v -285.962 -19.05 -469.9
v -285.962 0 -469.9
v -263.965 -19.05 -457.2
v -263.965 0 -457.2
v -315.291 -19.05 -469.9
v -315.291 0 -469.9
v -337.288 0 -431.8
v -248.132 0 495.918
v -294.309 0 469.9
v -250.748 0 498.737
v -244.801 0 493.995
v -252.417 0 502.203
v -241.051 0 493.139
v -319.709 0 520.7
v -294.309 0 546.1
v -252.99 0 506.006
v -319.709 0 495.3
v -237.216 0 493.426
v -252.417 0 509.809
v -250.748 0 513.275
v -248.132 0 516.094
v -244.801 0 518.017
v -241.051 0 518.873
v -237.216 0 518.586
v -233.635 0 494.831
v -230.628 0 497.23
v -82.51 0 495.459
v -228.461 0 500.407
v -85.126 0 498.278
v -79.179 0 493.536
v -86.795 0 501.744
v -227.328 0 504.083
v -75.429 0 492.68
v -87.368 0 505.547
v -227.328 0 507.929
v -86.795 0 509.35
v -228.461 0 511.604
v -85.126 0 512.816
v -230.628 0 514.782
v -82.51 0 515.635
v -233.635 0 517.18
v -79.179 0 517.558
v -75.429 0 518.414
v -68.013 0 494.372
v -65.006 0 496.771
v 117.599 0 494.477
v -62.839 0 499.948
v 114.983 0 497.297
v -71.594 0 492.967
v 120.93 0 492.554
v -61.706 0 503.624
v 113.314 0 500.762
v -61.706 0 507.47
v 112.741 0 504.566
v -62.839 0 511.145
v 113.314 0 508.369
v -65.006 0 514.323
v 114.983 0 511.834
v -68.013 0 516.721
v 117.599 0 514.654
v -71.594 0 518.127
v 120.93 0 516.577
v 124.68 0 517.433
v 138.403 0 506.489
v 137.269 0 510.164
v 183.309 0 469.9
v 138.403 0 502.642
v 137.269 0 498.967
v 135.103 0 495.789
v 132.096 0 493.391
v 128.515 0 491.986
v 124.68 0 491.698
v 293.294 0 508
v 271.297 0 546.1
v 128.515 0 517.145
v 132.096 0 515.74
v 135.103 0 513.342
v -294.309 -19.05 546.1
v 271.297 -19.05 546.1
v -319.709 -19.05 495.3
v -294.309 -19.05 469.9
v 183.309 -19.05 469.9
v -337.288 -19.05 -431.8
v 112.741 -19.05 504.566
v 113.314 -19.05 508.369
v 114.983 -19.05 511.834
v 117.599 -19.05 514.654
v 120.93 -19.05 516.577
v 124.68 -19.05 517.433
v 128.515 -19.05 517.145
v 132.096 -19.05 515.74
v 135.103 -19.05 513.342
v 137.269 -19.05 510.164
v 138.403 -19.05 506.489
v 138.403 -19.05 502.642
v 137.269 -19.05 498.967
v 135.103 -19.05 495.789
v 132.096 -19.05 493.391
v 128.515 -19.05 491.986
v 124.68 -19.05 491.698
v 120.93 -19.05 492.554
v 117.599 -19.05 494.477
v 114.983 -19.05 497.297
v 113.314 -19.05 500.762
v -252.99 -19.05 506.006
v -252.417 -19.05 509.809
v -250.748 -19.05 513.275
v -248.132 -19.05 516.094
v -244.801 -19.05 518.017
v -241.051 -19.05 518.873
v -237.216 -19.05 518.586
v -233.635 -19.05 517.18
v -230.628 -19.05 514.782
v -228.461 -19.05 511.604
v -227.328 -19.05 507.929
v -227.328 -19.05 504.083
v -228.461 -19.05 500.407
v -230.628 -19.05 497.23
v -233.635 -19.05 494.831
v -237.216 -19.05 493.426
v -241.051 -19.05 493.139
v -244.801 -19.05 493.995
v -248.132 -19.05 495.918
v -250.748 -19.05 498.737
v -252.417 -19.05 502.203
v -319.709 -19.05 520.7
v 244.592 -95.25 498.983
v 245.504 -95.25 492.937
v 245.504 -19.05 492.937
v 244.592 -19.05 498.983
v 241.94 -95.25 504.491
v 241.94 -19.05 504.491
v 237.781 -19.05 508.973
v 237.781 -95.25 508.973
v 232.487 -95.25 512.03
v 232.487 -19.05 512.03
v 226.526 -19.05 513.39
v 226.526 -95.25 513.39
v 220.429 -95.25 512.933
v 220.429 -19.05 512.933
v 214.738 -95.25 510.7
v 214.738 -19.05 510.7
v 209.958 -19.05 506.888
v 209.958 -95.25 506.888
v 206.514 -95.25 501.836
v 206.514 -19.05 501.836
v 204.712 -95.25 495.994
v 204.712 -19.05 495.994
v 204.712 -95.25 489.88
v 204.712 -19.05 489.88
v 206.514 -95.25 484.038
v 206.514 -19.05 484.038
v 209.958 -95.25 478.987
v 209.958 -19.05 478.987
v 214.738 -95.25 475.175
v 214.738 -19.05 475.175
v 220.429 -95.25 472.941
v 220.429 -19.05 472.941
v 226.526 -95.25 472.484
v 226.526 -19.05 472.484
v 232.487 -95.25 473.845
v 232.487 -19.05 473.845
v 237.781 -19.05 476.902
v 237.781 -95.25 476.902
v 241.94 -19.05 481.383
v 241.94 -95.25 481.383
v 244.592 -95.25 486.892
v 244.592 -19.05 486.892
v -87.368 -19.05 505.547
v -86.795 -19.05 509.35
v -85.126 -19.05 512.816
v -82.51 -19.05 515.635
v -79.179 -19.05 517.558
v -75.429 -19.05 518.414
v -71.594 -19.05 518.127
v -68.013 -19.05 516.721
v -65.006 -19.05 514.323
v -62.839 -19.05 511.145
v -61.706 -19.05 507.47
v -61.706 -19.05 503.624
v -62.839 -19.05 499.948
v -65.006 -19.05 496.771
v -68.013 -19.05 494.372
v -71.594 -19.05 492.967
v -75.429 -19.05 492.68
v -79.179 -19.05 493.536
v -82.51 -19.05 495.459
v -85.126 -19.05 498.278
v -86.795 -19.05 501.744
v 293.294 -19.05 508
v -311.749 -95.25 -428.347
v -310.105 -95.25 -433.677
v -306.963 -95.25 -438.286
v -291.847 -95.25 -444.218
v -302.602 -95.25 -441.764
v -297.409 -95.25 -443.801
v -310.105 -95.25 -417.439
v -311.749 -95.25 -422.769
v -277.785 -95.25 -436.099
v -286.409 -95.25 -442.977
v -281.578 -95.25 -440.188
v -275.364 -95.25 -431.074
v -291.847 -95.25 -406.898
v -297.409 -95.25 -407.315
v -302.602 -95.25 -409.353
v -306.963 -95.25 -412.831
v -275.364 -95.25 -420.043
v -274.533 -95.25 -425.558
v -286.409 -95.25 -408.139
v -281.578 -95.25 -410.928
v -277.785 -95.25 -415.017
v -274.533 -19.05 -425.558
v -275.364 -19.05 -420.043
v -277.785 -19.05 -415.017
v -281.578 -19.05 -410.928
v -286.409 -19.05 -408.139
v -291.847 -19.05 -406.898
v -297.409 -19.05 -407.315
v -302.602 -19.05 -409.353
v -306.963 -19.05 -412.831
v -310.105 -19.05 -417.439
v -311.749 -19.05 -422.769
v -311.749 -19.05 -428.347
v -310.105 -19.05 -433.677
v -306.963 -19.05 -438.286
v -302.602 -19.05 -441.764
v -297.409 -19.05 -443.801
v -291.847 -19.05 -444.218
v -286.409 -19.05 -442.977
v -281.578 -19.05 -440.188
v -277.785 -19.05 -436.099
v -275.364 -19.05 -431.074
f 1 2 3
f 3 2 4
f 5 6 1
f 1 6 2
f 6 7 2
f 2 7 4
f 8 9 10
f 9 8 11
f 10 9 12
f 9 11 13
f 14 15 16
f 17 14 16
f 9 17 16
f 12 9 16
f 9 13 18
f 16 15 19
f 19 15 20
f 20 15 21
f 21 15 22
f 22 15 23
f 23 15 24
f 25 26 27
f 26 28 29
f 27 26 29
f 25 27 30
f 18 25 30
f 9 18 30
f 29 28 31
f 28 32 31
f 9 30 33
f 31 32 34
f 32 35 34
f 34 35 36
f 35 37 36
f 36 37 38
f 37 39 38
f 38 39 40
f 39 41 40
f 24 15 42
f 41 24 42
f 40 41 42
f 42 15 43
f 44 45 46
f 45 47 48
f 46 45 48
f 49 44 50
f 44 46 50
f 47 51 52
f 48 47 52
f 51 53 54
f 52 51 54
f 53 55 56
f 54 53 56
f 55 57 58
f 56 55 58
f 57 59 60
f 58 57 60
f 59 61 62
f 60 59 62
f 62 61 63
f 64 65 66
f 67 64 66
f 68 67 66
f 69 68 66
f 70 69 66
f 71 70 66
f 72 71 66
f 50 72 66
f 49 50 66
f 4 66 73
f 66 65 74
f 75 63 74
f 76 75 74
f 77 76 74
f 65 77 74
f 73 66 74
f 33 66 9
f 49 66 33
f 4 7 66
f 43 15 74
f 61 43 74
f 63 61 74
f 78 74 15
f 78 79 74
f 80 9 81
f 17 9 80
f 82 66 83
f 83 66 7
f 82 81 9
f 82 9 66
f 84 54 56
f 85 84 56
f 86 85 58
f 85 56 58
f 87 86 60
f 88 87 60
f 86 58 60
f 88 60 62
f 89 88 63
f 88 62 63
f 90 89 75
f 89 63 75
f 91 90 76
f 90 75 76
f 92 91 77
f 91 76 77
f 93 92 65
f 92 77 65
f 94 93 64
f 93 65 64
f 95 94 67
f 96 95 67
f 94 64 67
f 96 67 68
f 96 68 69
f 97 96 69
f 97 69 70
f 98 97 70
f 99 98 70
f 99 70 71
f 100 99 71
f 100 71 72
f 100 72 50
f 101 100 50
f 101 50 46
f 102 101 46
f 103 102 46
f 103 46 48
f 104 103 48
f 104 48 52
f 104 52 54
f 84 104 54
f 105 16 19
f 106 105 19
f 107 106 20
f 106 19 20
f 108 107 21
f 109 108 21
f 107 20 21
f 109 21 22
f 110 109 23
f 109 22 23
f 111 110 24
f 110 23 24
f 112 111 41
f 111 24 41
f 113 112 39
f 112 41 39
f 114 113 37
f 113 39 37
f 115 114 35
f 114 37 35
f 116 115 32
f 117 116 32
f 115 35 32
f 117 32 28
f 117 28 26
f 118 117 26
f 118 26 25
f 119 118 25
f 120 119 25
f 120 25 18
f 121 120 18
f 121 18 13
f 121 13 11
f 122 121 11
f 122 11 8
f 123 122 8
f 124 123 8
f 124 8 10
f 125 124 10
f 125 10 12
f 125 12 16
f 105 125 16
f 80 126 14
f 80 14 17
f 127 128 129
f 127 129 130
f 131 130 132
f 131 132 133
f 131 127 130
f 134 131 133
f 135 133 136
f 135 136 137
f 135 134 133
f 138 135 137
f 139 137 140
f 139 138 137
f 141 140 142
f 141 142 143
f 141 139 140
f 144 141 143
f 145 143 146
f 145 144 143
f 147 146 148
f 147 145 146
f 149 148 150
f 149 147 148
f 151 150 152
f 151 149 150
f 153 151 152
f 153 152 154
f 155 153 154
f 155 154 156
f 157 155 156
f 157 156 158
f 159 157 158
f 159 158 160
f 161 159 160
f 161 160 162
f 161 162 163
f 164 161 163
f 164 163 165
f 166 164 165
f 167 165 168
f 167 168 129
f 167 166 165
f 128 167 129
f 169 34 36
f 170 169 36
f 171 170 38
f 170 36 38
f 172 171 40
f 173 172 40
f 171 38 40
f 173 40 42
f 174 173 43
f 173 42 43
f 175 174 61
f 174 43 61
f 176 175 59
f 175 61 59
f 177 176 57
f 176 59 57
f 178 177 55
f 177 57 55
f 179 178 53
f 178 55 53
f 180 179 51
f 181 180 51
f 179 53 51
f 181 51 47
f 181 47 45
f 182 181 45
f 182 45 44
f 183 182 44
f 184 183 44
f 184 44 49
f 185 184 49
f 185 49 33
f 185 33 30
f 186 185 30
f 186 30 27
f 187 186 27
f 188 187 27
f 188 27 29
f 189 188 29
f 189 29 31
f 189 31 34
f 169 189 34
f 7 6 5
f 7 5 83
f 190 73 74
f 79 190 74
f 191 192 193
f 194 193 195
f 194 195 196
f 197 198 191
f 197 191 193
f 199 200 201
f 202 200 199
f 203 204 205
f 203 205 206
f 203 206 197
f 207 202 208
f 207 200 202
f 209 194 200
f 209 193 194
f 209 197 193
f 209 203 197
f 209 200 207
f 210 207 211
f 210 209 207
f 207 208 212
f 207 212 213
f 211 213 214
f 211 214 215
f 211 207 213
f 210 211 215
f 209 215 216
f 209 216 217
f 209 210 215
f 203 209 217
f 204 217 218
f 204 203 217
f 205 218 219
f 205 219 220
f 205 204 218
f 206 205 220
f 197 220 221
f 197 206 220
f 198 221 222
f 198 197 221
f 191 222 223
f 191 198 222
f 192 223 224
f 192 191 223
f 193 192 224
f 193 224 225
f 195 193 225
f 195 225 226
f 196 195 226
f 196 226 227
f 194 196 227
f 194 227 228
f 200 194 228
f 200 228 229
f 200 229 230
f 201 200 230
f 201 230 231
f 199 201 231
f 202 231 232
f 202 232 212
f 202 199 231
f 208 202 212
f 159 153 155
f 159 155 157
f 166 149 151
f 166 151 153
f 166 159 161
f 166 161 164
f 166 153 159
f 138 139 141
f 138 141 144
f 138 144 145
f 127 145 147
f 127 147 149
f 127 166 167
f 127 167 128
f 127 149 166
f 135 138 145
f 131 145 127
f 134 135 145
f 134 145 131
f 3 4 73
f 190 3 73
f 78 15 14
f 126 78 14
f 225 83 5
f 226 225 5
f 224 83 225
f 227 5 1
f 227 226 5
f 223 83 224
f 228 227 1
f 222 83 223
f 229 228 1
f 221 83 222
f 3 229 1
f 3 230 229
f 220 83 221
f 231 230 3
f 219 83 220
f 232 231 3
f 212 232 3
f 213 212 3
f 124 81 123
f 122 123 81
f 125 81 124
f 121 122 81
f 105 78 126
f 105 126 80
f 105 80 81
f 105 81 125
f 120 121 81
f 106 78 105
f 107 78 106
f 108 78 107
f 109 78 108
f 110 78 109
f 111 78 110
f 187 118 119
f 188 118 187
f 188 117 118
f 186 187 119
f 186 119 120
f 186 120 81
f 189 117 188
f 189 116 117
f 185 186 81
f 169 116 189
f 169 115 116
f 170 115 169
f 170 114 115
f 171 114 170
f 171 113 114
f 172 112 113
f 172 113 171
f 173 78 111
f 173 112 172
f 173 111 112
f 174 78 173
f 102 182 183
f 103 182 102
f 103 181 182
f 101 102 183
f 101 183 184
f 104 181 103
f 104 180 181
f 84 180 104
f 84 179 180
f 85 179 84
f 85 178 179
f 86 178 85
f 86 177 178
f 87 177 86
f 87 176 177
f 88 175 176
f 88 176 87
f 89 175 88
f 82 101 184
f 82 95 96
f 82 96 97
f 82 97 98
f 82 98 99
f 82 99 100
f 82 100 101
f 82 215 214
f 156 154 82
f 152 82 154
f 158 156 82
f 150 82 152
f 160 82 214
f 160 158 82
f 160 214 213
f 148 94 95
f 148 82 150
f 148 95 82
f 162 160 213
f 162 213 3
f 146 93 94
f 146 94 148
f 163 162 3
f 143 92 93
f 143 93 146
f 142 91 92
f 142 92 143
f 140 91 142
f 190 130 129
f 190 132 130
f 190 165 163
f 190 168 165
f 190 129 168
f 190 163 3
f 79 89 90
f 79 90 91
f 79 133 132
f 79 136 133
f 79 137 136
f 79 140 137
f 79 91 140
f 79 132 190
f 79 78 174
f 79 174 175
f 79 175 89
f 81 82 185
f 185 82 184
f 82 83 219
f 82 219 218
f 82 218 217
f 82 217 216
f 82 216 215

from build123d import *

# Parameters (mm, degrees)
F1_DEPTH    = 19.05
F3_DEPTH    = 19.05
F5_D        = 25.8064
F7_R        = 20.5102138496
F7_R_2      = 18.7123578019
F8_DEPTH    = 76.2
F9_T1_DEPTH = 149.6914957887
F9_T3_DEPTH = 96.8143860217
F9_T5_DEPTH = 241.603940201


# Not quite as in the source:
# - a fillet or chamfer that OpenCascade refuses, or shapes differently, is made with other operations: its cross-section is extruded or revolved along the edge and cut away or added


with BuildPart() as f1:
    # F0 (on Front) → F1 (new body)
    with BuildSketch(Plane.XZ):
        Polygon((315.2909820045, 546.1), (227.30280098, 546.1), (-359.2850725167, -469.9), (-271.2968914922, -469.9), align=None)
    extrude(amount=F1_DEPTH)

    # F2 (on face) → F3 (join, through all)
    with BuildSketch(Plane.XZ.offset(19.05)):
        Polygon((227.30280098, 546.1), (-319.7090179955, 546.1), (-319.7090179955, 469.9), (183.3087104677, 469.9), align=None)
    extrude(amount=-F3_DEPTH)

    # F5 (through all)
    with Locations(Plane.XZ.offset(19.05)):
        with Locations((-240.0867491961, 506.0059428215), (-74.4647756219, 505.5469870567), (125.6440877914, 504.5655369759)):
            Hole(F5_D / 2)

    # F7 (on offset) → F8 (join, through all)
    with BuildSketch(Plane.XZ.offset(95.25)):
        with Locations((224.993377924, 492.937207222)):
            Circle(F7_R)
        with Locations((-293.2454049587, -425.5582988262)):
            Circle(F7_R_2)
    extrude(amount=-F8_DEPTH)

    # F9: chamfer of 25.4 on 5 edges, made by hand

    # F9_s2 → F9_t1 (cut)
    with BuildSketch(Plane.XZ.offset(-65.3207478943)):
        Polygon((-294.3090179955, 546.1), (-319.7090179955, 520.7), (-319.7090179955, 546.1), align=None)
        Polygon((-294.3090179955, 469.9), (-319.7090179955, 495.3), (-319.7090179955, 469.9), align=None)
    extrude(amount=F9_T1_DEPTH, mode=Mode.SUBTRACT)

    # F9_s4 → F9_t3 (cut)
    with BuildSketch(Plane.XZ.offset(-38.8821930109)):
        Polygon((-285.9615883296, -469.9), (-263.9645430735, -457.2), (-271.2968914922, -469.9), align=None)
    extrude(amount=F9_T3_DEPTH, mode=Mode.SUBTRACT)

    # F9_s6 → F9_t5 (cut)
    with BuildSketch(Plane.XZ.offset(-111.2769701005)):
        Polygon((293.2939367483, 508), (271.2968914922, 546.1), (315.2909820045, 546.1), align=None)
        Polygon((-315.2909820045, -469.9), (-337.2880272606, -431.8), (-359.2850725167, -469.9), align=None)
    extrude(amount=F9_T5_DEPTH, mode=Mode.SUBTRACT)


solid = f1.part
